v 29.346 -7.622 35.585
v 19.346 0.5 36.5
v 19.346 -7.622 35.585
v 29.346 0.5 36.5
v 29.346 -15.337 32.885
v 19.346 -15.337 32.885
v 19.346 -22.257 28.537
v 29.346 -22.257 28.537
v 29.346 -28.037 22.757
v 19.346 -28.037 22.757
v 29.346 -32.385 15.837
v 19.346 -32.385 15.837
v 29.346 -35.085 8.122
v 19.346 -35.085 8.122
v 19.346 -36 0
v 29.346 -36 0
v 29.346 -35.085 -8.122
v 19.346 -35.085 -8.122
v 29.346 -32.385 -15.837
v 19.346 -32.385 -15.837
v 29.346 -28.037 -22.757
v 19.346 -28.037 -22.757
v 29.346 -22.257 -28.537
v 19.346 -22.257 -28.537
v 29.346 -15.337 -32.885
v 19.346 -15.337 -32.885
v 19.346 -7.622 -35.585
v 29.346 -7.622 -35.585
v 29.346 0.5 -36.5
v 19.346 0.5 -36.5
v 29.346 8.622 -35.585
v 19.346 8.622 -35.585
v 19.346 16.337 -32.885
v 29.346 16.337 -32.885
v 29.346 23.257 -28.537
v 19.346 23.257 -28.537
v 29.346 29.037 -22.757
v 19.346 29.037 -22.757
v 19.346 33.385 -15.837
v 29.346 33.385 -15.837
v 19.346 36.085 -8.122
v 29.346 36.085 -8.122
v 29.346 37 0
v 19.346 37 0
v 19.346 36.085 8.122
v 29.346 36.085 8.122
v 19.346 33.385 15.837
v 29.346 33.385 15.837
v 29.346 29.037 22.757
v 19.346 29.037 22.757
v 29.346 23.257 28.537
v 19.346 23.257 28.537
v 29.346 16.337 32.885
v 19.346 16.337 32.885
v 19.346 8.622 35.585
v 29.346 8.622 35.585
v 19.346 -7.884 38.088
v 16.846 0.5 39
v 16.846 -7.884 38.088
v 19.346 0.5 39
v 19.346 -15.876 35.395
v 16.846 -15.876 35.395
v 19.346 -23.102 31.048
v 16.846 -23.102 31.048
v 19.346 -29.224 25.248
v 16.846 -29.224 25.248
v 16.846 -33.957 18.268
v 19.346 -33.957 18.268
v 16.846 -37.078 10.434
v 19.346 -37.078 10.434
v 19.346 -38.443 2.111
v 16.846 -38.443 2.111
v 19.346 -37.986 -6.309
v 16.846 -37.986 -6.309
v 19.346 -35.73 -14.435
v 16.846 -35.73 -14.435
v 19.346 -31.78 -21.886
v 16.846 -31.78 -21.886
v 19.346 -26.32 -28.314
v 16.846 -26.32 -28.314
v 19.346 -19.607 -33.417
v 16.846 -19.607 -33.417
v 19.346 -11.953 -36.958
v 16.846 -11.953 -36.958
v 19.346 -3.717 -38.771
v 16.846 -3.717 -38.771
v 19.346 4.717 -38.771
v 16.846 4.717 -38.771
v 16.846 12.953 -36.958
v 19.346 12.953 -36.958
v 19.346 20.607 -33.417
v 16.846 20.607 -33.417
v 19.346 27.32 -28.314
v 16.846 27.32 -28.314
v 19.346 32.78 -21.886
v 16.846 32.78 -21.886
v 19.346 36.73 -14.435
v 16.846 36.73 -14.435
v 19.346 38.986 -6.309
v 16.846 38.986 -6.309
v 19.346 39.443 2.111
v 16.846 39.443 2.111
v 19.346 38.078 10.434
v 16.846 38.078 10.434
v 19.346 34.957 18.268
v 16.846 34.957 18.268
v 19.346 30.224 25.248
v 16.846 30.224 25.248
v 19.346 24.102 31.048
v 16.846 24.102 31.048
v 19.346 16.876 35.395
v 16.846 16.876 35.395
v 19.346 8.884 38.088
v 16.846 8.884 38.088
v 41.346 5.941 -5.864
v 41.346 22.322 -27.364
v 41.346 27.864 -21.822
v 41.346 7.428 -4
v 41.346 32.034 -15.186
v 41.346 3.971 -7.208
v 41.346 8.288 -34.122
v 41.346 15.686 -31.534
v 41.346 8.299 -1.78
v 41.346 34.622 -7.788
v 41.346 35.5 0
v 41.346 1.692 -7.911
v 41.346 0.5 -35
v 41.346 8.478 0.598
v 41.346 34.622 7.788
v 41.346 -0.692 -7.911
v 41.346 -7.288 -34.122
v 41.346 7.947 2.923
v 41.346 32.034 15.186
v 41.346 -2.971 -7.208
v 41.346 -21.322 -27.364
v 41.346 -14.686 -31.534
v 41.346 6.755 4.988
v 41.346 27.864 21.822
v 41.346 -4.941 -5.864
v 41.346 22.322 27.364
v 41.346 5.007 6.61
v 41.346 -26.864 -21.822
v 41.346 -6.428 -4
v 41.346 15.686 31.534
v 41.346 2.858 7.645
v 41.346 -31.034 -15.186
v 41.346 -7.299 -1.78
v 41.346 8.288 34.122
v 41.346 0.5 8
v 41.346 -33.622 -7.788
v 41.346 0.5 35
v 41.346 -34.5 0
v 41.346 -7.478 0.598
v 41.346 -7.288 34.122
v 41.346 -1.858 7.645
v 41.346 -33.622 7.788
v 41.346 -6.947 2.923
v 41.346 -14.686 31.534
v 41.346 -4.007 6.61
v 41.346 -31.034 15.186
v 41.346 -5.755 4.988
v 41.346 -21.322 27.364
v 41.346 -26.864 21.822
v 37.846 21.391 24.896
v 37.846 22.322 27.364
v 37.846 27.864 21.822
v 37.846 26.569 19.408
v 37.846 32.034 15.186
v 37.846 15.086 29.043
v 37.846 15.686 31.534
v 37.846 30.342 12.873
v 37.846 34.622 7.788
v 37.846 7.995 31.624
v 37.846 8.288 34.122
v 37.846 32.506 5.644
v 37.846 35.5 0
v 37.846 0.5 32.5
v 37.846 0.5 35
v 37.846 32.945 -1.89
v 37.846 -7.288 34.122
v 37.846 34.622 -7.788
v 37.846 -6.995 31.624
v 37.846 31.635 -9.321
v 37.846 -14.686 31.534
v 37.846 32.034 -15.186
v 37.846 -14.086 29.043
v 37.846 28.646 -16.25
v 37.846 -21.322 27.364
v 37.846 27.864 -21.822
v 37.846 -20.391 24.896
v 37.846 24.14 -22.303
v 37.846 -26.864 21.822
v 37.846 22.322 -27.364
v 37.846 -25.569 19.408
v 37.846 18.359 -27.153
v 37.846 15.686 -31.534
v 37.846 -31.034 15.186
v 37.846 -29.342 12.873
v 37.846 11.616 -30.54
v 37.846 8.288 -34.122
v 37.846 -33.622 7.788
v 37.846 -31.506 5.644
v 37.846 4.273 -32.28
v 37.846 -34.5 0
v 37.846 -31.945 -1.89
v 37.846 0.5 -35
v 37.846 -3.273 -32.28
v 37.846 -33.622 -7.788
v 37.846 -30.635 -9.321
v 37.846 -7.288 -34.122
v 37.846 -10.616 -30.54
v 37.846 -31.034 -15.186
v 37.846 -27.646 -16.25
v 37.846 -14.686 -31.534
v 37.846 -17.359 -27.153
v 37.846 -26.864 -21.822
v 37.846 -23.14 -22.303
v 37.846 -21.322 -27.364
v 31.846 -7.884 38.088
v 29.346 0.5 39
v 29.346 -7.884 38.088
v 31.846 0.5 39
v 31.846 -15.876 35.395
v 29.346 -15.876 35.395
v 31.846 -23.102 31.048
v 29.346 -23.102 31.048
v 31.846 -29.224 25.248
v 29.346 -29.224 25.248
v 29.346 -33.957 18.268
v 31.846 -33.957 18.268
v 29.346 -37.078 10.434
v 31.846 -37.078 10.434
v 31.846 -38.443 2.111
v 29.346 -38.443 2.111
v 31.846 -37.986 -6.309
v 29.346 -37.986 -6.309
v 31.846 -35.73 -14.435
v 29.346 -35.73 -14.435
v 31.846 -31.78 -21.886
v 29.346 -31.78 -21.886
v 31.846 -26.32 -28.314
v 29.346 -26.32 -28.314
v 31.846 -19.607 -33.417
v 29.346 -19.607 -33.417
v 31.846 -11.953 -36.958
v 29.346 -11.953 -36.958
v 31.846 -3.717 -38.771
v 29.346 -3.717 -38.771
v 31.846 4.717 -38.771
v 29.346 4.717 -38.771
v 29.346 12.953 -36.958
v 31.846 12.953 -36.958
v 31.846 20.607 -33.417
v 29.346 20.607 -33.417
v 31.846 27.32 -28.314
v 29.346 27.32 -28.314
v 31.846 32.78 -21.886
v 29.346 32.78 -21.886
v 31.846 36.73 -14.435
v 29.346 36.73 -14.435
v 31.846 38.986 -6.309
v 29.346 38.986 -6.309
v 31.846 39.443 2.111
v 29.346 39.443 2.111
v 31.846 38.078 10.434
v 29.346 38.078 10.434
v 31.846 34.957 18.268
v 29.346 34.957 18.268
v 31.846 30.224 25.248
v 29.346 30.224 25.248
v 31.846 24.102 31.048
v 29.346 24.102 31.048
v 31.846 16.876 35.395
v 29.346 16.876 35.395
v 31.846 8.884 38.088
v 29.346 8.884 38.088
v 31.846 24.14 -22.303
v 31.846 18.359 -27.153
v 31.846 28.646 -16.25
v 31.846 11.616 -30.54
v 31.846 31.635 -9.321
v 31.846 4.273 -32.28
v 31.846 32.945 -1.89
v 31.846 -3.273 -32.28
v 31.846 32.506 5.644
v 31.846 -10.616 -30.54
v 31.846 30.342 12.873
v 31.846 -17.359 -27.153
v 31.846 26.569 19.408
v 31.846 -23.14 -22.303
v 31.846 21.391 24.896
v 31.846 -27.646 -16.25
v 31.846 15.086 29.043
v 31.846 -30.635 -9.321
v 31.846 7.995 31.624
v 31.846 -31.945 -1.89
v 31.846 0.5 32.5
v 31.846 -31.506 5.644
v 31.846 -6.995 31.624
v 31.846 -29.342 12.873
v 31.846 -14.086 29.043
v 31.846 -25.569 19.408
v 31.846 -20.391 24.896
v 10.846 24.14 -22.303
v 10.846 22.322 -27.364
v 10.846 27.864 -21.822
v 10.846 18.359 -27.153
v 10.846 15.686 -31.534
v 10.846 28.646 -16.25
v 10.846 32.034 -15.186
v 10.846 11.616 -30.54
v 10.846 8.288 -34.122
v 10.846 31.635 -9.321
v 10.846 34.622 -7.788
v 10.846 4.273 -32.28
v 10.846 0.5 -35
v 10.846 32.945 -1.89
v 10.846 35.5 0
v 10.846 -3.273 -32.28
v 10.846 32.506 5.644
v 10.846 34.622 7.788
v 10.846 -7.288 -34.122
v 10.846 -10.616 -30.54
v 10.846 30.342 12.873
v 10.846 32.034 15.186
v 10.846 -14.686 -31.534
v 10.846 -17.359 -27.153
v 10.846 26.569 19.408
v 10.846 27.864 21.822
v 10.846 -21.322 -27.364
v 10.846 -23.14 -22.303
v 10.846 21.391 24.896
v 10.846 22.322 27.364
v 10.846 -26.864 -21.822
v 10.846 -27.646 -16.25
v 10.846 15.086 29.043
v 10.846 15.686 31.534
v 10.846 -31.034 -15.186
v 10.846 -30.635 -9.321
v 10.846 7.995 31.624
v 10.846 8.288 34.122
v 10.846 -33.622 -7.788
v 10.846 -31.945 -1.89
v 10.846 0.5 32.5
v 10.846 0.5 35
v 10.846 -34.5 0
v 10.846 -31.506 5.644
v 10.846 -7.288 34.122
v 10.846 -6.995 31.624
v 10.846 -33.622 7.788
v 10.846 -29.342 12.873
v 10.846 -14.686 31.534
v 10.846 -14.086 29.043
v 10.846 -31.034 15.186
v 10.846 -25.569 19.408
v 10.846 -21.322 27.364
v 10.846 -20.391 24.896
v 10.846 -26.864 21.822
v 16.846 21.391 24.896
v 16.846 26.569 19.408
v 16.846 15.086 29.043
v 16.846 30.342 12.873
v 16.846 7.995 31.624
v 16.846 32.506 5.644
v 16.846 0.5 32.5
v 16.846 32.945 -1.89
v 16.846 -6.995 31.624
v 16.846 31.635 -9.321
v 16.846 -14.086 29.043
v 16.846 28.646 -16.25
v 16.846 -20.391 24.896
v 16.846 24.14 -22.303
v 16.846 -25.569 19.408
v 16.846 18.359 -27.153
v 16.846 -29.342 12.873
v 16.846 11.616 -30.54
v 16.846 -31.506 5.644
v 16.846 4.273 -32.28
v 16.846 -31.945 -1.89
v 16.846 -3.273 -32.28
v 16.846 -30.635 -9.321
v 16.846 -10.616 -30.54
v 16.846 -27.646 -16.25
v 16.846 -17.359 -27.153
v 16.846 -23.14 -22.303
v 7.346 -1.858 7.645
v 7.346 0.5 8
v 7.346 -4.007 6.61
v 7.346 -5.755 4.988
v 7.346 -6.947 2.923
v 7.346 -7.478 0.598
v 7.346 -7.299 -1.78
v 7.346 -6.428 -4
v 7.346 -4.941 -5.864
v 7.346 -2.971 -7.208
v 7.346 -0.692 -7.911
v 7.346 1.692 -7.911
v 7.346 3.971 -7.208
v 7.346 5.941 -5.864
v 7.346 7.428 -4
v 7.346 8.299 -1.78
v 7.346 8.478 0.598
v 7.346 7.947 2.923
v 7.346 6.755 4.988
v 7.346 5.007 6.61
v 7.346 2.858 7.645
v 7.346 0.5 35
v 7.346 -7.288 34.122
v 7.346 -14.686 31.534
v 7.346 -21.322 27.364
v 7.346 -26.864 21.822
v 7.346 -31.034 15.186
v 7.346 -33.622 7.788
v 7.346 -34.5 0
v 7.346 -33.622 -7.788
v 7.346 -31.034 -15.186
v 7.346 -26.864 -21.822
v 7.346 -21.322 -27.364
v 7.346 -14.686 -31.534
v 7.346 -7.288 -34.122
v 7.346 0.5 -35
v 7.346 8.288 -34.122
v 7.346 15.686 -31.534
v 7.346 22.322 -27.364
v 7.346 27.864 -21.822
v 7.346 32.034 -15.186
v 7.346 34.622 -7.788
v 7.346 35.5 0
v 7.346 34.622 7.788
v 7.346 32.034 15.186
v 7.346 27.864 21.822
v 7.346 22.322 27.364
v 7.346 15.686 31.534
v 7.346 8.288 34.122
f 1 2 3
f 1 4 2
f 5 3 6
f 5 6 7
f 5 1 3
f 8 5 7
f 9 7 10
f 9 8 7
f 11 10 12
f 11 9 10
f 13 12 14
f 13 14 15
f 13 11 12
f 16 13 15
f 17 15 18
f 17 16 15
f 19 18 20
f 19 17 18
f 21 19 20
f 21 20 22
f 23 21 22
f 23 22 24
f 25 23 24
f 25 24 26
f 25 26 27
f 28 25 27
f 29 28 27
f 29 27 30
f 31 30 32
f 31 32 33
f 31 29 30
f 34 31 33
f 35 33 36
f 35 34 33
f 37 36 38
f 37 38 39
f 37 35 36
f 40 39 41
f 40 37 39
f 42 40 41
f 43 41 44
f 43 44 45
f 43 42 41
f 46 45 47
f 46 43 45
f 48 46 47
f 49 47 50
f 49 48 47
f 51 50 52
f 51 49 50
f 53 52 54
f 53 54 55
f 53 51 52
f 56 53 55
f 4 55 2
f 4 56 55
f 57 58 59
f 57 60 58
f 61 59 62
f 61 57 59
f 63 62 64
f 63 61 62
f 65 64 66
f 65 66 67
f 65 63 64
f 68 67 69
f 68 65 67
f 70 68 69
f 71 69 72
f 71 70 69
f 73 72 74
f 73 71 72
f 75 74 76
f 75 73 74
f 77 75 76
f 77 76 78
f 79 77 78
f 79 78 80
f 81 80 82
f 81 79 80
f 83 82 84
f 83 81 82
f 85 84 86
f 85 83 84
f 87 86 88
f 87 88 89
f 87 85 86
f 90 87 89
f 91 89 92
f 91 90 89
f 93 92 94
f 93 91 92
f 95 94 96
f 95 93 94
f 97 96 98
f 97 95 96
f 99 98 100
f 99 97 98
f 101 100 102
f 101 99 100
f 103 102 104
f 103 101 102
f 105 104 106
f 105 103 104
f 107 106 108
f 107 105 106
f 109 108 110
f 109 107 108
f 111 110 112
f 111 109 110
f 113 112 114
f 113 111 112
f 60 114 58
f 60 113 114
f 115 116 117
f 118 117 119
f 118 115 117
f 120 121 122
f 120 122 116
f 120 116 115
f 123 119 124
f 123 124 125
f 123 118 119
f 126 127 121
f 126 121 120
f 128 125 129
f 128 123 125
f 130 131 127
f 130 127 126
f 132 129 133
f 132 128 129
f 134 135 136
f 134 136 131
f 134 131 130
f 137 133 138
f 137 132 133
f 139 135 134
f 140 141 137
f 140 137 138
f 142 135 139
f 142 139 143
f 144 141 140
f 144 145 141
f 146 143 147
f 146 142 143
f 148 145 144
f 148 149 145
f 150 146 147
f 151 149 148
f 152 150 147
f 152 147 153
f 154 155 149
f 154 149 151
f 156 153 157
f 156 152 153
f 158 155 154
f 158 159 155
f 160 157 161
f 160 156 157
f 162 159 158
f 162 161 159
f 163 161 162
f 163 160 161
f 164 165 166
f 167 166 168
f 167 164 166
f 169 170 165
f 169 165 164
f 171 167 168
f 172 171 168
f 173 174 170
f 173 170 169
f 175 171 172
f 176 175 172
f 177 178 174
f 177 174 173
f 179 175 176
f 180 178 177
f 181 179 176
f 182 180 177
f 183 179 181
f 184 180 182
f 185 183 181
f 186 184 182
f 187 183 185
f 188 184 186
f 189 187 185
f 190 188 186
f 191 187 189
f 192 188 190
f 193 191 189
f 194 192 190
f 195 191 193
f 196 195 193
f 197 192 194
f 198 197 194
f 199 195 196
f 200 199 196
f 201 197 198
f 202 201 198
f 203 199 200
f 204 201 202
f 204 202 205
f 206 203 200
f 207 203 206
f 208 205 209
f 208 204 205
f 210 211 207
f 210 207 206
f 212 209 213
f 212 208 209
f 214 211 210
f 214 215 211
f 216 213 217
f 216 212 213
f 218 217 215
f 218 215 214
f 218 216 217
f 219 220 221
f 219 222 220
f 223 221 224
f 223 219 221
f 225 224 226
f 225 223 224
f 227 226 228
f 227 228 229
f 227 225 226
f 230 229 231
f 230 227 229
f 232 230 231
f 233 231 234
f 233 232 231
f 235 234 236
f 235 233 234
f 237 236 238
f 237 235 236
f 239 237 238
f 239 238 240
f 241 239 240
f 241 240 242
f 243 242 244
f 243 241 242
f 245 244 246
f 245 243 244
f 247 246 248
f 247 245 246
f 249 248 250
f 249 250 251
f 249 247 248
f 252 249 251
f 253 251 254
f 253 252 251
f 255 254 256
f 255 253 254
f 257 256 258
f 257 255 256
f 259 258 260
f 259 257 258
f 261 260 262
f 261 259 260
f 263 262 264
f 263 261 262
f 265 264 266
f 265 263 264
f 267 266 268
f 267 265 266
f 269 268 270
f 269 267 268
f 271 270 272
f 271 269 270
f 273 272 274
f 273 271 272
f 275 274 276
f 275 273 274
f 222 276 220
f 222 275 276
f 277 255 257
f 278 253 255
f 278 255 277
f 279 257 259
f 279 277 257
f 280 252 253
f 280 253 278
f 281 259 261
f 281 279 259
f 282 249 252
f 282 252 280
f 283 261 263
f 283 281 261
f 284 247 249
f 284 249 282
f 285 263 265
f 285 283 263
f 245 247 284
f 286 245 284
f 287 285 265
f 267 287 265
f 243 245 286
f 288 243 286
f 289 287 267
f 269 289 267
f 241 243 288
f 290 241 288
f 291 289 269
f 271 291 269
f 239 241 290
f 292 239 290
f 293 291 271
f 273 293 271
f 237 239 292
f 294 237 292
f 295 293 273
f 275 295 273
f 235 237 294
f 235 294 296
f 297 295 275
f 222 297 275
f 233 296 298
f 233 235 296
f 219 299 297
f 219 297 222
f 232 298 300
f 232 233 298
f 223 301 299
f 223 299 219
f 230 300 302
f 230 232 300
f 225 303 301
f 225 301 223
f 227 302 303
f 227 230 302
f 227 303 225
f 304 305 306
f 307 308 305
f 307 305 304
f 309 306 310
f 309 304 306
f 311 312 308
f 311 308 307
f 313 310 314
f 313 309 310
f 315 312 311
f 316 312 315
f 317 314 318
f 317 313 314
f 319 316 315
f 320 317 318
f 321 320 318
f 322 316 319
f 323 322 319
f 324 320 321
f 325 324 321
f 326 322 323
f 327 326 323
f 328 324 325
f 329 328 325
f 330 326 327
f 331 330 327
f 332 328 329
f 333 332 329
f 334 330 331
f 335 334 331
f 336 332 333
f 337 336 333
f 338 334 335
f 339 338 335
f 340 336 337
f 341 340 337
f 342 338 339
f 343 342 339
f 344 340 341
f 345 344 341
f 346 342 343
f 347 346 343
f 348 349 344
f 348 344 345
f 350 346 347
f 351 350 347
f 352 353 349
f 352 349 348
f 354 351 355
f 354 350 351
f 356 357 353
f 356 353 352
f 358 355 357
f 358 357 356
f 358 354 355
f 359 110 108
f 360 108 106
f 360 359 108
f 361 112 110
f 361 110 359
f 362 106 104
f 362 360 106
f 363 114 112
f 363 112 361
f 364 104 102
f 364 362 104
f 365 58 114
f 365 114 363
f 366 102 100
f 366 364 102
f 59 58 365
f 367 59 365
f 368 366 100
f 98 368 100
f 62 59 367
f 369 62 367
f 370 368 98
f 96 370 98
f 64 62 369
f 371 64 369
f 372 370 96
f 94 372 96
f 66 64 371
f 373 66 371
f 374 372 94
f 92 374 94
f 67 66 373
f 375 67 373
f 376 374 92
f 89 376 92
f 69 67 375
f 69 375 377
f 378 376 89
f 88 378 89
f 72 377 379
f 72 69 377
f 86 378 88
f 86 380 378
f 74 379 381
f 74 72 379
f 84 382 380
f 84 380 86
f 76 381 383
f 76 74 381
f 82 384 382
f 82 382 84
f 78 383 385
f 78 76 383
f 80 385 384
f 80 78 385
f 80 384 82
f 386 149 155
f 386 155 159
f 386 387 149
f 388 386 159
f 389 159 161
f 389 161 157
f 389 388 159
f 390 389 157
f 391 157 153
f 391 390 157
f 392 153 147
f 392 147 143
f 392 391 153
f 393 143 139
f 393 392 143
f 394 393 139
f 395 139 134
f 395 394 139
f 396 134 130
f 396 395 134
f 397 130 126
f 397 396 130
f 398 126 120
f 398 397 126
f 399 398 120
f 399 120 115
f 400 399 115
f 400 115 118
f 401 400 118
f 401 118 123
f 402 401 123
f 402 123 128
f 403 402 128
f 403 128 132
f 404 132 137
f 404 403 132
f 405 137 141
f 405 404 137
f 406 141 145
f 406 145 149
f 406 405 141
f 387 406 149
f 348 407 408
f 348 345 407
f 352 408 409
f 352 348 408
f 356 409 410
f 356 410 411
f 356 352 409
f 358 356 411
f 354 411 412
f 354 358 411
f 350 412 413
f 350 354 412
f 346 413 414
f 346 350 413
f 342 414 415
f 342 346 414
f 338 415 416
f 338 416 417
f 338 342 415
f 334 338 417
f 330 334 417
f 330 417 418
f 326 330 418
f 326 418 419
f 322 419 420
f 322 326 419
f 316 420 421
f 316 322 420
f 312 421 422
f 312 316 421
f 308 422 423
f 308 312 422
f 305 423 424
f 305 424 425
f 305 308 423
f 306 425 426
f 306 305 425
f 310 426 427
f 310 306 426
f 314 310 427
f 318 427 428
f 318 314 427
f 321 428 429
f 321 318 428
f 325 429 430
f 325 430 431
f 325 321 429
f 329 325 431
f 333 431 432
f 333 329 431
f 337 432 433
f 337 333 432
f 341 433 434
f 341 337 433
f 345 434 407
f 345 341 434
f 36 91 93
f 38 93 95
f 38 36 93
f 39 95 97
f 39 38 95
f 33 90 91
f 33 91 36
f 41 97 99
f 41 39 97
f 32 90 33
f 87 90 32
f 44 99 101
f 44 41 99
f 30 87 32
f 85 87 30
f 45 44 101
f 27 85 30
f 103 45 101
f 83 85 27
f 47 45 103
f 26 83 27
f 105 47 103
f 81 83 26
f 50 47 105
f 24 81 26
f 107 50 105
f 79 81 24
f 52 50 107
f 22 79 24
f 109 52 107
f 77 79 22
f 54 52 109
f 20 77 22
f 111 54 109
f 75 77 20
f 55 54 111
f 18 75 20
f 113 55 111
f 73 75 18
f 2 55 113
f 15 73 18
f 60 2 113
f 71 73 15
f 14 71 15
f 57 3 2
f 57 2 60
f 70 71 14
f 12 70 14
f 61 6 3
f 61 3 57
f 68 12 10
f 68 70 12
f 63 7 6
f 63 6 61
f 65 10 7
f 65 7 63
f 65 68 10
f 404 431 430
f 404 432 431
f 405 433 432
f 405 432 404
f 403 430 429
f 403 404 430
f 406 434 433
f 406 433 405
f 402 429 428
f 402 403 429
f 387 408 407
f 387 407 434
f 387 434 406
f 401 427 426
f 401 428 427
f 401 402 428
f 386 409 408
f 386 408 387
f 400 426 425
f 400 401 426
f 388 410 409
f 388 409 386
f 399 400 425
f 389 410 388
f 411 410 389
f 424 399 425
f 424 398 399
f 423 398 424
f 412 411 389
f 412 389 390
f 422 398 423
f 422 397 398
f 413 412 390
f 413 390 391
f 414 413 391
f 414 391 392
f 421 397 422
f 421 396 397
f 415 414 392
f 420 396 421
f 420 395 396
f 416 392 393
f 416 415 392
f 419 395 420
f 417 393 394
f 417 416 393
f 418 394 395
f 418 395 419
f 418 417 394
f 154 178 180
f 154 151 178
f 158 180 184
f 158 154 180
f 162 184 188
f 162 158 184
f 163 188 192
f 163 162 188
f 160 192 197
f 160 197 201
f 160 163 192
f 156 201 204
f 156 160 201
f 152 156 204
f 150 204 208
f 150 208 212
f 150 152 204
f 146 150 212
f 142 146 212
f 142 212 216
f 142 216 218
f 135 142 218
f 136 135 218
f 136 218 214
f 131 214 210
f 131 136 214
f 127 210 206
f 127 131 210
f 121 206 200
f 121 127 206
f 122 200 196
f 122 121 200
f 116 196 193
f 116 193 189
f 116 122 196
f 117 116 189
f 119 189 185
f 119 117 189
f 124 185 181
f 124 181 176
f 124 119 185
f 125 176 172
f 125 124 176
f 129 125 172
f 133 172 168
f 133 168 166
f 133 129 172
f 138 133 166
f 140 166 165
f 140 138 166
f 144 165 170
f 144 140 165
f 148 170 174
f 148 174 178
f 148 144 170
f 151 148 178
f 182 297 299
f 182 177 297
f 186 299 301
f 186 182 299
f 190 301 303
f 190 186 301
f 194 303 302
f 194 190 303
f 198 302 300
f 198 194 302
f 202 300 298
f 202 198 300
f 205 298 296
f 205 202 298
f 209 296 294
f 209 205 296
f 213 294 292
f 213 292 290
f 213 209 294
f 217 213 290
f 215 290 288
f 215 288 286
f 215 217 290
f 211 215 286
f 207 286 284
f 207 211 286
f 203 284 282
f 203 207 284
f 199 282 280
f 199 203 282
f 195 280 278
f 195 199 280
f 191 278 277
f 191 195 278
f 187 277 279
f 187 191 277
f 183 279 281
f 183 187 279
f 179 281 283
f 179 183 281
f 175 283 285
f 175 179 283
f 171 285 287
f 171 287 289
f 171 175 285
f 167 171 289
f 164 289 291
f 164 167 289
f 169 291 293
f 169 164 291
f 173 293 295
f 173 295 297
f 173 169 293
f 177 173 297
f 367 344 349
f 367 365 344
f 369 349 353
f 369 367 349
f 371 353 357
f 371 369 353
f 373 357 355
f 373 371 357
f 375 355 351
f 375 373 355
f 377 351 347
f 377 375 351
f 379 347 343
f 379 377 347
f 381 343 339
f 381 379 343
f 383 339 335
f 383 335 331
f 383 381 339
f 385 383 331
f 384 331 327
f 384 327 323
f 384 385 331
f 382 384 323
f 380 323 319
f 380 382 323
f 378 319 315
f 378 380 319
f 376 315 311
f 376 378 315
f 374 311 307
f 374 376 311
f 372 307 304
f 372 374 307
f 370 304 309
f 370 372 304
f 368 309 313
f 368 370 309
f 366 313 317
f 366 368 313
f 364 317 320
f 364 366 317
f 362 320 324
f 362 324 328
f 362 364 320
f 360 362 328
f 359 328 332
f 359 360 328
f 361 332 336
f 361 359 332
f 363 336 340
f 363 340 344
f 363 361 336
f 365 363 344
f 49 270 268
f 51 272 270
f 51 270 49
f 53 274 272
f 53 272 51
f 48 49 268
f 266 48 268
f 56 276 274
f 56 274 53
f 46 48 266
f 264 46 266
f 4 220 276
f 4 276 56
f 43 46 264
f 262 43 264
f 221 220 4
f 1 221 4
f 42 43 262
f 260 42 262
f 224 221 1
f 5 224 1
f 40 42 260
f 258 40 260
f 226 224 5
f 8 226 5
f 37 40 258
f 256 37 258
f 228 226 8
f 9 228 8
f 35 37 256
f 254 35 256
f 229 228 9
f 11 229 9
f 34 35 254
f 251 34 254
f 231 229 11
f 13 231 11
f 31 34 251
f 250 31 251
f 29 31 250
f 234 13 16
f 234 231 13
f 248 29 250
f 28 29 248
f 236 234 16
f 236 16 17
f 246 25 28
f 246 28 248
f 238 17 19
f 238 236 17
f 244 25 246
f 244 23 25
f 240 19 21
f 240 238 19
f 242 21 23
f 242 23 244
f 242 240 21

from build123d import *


with BuildPart() as part:
    # Croquis1 → Revolución1 (revolve)
    with BuildSketch(Plane.XY, mode=Mode.PRIVATE) as revoluci_n1_sk:
        Polygon((7.346100741, 8.5), (7.346100741, 35.5), (10.846100741, 35.5), (10.846100741, 33), (16.846100741, 33), (16.846100741, 39.5), (19.346100741, 39.5), (19.346100741, 37), (29.346100741, 37), (29.346100741, 39.5), (31.846100741, 39.5), (31.846100741, 33), (37.846100741, 33), (37.846100741, 35.5), (41.346100741, 35.5), (41.346100741, 8.5), align=None)
    revolve(revoluci_n1_sk.sketch.rotate(Axis((-1, 0.5, 0), (1, 0, 0)), 90), axis=Axis((-1, 0.5, 0), (1, 0, 0)))


solid = part.part
